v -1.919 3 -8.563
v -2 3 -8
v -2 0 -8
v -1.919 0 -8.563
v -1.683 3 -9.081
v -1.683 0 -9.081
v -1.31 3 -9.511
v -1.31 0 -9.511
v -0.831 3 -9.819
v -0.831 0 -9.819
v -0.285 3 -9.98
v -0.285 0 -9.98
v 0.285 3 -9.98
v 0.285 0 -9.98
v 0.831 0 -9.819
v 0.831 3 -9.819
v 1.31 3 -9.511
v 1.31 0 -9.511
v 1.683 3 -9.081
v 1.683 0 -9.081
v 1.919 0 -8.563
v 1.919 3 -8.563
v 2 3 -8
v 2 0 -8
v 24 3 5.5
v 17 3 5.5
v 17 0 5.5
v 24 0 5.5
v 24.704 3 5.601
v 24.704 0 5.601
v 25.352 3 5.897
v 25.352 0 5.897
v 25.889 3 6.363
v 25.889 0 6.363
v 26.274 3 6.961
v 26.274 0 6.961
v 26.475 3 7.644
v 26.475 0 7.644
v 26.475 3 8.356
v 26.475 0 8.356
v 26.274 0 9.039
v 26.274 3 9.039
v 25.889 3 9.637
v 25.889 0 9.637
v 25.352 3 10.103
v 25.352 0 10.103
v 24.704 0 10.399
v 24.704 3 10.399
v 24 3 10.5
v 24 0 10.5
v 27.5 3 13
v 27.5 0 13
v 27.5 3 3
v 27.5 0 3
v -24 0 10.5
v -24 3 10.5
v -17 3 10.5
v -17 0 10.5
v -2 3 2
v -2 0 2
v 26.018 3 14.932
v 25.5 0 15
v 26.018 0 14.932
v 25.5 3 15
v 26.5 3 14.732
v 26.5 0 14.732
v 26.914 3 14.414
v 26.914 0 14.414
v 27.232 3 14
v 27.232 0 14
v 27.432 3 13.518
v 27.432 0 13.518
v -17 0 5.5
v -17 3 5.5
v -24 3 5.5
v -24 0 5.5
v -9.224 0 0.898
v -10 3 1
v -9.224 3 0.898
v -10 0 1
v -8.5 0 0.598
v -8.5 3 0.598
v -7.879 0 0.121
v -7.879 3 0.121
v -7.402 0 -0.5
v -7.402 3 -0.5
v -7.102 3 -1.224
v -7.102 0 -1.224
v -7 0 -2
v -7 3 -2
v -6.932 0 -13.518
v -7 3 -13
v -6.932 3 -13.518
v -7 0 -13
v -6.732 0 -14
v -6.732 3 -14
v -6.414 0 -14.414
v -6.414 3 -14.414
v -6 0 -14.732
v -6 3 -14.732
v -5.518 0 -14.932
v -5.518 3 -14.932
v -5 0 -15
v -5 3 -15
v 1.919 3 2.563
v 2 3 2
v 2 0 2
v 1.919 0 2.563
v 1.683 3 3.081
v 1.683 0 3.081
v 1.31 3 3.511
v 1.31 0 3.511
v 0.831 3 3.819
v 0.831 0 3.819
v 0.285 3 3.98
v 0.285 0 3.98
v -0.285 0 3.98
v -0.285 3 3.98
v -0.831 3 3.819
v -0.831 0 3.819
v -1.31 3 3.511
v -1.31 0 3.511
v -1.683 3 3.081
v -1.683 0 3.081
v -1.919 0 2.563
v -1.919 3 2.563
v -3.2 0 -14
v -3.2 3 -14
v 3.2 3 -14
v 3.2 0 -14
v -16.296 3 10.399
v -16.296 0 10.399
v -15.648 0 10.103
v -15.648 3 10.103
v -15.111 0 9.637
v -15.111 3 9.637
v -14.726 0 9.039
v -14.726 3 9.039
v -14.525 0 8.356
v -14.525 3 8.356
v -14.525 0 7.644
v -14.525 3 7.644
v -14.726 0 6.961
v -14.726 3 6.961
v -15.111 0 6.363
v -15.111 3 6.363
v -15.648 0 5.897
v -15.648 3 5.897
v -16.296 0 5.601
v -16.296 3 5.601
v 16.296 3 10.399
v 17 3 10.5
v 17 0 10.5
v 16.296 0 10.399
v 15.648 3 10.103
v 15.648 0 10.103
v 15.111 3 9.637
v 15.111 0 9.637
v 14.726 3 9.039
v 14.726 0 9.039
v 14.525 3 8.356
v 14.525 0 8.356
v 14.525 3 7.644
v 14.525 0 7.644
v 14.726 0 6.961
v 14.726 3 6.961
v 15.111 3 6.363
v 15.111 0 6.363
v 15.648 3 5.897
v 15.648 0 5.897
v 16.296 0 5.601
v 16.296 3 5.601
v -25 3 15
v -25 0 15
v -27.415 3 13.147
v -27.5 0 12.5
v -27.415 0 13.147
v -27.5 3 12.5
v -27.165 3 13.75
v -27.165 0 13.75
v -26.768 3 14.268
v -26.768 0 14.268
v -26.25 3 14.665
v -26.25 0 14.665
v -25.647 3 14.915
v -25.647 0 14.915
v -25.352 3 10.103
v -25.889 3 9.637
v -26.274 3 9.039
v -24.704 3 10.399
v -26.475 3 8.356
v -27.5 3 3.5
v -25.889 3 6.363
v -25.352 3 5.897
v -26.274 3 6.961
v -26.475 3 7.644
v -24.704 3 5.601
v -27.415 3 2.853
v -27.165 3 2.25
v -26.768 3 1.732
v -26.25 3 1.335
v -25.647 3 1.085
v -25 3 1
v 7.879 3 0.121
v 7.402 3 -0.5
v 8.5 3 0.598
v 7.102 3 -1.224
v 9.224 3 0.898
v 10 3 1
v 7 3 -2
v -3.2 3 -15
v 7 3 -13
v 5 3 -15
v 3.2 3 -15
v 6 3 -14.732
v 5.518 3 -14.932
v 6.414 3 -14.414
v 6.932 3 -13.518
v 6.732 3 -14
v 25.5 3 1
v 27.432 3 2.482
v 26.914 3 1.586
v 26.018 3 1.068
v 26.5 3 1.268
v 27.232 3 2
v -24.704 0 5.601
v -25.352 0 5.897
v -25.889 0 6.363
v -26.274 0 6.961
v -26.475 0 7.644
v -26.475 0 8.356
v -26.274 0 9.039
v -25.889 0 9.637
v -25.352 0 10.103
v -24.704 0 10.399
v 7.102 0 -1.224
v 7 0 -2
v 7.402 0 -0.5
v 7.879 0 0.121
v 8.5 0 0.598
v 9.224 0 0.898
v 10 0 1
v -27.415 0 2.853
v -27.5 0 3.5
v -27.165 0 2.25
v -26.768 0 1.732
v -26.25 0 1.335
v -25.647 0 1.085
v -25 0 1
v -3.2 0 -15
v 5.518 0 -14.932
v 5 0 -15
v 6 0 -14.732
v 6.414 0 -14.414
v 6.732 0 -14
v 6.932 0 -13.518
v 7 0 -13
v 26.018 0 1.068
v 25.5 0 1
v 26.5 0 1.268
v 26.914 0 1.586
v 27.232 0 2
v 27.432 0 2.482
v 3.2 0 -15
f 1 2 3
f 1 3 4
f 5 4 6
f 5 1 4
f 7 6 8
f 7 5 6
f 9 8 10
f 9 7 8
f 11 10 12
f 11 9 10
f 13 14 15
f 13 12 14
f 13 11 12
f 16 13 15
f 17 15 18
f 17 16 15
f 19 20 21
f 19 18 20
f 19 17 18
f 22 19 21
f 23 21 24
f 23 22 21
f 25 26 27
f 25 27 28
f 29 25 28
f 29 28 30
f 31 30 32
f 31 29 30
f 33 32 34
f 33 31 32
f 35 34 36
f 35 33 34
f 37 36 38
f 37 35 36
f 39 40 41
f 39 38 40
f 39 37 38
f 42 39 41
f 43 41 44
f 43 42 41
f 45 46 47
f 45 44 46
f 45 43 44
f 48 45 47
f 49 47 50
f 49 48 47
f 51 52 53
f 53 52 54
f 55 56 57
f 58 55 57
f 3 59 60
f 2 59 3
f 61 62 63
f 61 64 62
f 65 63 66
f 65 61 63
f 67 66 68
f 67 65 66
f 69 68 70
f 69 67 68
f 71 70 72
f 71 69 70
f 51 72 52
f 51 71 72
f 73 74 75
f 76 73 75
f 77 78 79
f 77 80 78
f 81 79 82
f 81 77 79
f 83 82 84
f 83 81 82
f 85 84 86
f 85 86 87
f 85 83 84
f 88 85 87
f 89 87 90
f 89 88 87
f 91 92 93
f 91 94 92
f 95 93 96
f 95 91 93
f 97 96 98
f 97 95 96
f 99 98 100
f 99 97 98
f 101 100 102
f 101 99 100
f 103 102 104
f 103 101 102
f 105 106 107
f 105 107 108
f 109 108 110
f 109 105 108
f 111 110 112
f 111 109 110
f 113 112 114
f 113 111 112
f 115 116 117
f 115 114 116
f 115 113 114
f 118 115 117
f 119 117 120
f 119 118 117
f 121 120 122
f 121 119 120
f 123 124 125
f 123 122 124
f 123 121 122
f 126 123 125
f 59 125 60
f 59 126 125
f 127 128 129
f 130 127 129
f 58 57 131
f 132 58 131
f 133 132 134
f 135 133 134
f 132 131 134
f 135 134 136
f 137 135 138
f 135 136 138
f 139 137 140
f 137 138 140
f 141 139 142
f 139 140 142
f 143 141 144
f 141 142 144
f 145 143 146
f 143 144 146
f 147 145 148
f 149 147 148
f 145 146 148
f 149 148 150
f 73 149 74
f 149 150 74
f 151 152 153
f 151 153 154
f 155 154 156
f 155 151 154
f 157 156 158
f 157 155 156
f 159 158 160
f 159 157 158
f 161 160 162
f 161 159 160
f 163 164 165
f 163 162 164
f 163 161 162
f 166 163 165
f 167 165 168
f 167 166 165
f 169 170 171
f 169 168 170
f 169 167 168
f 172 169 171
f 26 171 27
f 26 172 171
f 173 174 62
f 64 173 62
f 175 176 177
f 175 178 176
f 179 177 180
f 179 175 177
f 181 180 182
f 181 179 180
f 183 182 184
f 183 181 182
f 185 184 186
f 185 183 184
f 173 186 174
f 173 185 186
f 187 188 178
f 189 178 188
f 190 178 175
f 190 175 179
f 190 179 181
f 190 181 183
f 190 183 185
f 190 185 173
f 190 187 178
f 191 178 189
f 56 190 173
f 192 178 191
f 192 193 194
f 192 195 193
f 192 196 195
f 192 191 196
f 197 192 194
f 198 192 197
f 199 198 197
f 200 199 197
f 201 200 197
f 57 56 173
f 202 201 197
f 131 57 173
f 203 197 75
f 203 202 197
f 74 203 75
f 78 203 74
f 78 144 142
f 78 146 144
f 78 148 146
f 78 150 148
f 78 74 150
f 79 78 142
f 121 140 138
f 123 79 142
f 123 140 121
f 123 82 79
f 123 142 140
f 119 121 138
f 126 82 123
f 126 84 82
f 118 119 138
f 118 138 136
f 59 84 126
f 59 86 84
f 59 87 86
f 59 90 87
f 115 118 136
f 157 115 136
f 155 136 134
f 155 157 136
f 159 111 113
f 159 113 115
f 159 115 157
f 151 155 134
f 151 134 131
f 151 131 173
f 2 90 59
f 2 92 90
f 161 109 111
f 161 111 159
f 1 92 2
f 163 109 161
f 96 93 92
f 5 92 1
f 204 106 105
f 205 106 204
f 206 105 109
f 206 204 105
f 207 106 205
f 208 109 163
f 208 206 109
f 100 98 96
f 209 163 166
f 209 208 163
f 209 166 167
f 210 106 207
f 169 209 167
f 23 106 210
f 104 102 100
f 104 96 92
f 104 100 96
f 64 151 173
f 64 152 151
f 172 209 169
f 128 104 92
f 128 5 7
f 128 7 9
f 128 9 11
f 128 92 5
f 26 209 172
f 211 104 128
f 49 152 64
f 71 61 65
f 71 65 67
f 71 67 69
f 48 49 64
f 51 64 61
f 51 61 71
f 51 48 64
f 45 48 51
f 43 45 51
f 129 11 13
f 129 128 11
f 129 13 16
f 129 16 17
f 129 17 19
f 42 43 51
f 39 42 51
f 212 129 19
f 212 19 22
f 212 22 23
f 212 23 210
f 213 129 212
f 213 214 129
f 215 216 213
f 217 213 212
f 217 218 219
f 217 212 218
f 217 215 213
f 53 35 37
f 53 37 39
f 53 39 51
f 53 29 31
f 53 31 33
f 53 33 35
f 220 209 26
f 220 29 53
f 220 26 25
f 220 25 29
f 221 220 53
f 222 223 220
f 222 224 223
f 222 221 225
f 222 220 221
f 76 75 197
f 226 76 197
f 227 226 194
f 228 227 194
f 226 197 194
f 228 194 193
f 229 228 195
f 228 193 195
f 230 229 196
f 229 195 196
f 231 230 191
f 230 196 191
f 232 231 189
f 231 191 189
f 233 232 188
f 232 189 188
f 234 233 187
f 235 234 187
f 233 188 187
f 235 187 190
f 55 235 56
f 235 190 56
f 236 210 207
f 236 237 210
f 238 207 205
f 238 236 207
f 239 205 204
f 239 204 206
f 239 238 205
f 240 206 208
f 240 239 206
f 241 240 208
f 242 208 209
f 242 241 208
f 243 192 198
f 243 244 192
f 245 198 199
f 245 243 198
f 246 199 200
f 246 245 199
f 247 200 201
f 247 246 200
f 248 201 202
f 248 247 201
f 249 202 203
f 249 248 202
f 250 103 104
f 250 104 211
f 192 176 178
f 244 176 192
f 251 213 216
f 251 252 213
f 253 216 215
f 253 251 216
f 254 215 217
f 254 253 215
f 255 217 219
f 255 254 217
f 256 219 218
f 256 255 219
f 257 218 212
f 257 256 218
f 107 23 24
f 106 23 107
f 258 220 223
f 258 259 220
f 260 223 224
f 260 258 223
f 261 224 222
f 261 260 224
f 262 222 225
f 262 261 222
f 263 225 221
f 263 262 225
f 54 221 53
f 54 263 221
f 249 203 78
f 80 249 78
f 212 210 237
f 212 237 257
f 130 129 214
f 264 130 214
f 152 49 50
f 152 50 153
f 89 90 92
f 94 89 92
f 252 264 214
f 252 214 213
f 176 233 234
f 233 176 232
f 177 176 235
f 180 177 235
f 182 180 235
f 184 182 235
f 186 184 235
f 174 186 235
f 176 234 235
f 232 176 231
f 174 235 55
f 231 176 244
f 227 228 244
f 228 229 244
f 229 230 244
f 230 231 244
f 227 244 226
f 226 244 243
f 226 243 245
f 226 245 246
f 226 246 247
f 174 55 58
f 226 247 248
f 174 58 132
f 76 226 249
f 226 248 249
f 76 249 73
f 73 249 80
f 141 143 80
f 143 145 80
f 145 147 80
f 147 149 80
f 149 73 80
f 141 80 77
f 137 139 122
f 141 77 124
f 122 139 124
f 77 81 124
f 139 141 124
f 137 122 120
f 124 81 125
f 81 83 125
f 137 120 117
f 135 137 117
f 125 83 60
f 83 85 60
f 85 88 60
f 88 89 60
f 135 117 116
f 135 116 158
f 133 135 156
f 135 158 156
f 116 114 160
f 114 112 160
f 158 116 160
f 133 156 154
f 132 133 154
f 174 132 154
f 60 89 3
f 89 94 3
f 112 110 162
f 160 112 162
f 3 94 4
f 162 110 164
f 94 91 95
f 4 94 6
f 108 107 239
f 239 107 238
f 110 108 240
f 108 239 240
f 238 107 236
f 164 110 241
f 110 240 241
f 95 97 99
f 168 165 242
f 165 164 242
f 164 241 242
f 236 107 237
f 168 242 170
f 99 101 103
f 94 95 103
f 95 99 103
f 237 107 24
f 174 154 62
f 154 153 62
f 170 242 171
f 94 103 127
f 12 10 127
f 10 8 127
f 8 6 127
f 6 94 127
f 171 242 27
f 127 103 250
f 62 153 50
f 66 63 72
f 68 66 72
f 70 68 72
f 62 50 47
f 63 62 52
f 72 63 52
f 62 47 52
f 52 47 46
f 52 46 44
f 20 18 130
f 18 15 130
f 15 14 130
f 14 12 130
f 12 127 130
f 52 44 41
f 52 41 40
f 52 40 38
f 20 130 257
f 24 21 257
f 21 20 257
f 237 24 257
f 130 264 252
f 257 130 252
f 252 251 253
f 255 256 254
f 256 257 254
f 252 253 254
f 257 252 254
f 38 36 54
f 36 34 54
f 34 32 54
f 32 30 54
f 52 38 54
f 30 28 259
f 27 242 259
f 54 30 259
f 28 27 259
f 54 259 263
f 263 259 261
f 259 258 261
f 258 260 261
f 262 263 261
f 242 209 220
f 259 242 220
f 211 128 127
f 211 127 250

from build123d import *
from OCP.BRepFilletAPI import BRepFilletAPI_MakeFillet

# Parameters (mm, degrees)
SKETCH1_W           = 55
SKETCH1_H           = 30
BOSS_EXTRUDE1_DEPTH = 3
CUT_EXTRUDE1_DEPTH  = 32.468237955
SKETCH3_W           = 6.4
SKETCH3_H           = 2
CUT_EXTRUDE2_DEPTH  = 32.468237955
SKETCH4_W           = 20.5
SKETCH4_H           = 16
CUT_EXTRUDE3_DEPTH  = 32.468237955
FILLET1_R1          = 3
FILLET1_R2          = 2.5
FILLET1_R3          = 2


with BuildPart() as part:
    # Sketch1 → Boss-Extrude1 (new body)
    with BuildSketch(Plane(origin=(0, 0, 0), x_dir=(1, 0, 0), z_dir=(0, 1, 0))):
        Rectangle(SKETCH1_W, SKETCH1_H)
    extrude(amount=BOSS_EXTRUDE1_DEPTH)

    # Sketch2 → Cut-Extrude1 (cut, through all)
    with BuildSketch(Plane(origin=(0, 3, 0), x_dir=(1, 0, 0), z_dir=(0, 1, 0))):
        with BuildLine():
            Line((17, -5.5), (24, -5.5))
            ThreePointArc((24, -5.5), (26.5, -8), (24, -10.5))
            Line((24, -10.5), (17, -10.5))
            ThreePointArc((17, -10.5), (14.5, -8), (17, -5.5))
        make_face()
        with BuildLine():
            Line((-17, -5.5), (-24, -5.5))
            ThreePointArc((-24, -5.5), (-26.5, -8), (-24, -10.5))
            Line((-24, -10.5), (-17, -10.5))
            ThreePointArc((-17, -10.5), (-14.5, -8), (-17, -5.5))
        make_face()
        with BuildLine():
            Line((-2, -2), (-2, 8))
            ThreePointArc((-2, 8), (0, 10), (2, 8))
            Line((2, 8), (2, -2))
            ThreePointArc((2, -2), (0, -4), (-2, -2))
        make_face()
    extrude(amount=-CUT_EXTRUDE1_DEPTH, mode=Mode.SUBTRACT)

    # Sketch3 → Cut-Extrude2 (cut, through all)
    with BuildSketch(Plane(origin=(0, 3, 0), x_dir=(1, 0, 0), z_dir=(0, 1, 0))):
        with Locations((0, 15)):
            Rectangle(SKETCH3_W, SKETCH3_H)
    extrude(amount=-CUT_EXTRUDE2_DEPTH, mode=Mode.SUBTRACT)

    # Sketch4 → Cut-Extrude3 (cut, through all)
    with BuildSketch(Plane(origin=(0, 3, 0), x_dir=(1, 0, 0), z_dir=(0, 1, 0))):
        with Locations((-17.25, 7)):
            Rectangle(SKETCH4_W, SKETCH4_H)
        with Locations((17.25, 7)):
            Rectangle(SKETCH4_W, SKETCH4_H)
    extrude(amount=-CUT_EXTRUDE3_DEPTH, mode=Mode.SUBTRACT)

    # Fillet1: one fillet with a radius per group of edges: ONE call of the kernel's fillet builder (fillet() takes one radius for all edges)
    fillet1_edges_1 = [part.edges().sort_by_distance(p)[0] for p in [
        (7, 1.5, 1),
        (-7, 1.5, 1),
    ]]
    fillet1_edges_2 = [part.edges().sort_by_distance(p)[0] for p in [
        (-27.5, 1.5, 1),
        (-27.5, 1.5, 15),
    ]]
    fillet1_edges_3 = [part.edges().sort_by_distance(p)[0] for p in [
        (27.5, 1.5, 1),
        (27.5, 1.5, 15),
        (7, 1.5, -15),
        (-7, 1.5, -15),
    ]]
    fillet1 = BRepFilletAPI_MakeFillet(part.part.solid().wrapped)
    for e in fillet1_edges_1:
        fillet1.Add(FILLET1_R1, e.wrapped)
    for e in fillet1_edges_2:
        fillet1.Add(FILLET1_R2, e.wrapped)
    for e in fillet1_edges_3:
        fillet1.Add(FILLET1_R3, e.wrapped)
    add(Compound.cast(fillet1.Shape()), mode=Mode.REPLACE)


solid = part.part
